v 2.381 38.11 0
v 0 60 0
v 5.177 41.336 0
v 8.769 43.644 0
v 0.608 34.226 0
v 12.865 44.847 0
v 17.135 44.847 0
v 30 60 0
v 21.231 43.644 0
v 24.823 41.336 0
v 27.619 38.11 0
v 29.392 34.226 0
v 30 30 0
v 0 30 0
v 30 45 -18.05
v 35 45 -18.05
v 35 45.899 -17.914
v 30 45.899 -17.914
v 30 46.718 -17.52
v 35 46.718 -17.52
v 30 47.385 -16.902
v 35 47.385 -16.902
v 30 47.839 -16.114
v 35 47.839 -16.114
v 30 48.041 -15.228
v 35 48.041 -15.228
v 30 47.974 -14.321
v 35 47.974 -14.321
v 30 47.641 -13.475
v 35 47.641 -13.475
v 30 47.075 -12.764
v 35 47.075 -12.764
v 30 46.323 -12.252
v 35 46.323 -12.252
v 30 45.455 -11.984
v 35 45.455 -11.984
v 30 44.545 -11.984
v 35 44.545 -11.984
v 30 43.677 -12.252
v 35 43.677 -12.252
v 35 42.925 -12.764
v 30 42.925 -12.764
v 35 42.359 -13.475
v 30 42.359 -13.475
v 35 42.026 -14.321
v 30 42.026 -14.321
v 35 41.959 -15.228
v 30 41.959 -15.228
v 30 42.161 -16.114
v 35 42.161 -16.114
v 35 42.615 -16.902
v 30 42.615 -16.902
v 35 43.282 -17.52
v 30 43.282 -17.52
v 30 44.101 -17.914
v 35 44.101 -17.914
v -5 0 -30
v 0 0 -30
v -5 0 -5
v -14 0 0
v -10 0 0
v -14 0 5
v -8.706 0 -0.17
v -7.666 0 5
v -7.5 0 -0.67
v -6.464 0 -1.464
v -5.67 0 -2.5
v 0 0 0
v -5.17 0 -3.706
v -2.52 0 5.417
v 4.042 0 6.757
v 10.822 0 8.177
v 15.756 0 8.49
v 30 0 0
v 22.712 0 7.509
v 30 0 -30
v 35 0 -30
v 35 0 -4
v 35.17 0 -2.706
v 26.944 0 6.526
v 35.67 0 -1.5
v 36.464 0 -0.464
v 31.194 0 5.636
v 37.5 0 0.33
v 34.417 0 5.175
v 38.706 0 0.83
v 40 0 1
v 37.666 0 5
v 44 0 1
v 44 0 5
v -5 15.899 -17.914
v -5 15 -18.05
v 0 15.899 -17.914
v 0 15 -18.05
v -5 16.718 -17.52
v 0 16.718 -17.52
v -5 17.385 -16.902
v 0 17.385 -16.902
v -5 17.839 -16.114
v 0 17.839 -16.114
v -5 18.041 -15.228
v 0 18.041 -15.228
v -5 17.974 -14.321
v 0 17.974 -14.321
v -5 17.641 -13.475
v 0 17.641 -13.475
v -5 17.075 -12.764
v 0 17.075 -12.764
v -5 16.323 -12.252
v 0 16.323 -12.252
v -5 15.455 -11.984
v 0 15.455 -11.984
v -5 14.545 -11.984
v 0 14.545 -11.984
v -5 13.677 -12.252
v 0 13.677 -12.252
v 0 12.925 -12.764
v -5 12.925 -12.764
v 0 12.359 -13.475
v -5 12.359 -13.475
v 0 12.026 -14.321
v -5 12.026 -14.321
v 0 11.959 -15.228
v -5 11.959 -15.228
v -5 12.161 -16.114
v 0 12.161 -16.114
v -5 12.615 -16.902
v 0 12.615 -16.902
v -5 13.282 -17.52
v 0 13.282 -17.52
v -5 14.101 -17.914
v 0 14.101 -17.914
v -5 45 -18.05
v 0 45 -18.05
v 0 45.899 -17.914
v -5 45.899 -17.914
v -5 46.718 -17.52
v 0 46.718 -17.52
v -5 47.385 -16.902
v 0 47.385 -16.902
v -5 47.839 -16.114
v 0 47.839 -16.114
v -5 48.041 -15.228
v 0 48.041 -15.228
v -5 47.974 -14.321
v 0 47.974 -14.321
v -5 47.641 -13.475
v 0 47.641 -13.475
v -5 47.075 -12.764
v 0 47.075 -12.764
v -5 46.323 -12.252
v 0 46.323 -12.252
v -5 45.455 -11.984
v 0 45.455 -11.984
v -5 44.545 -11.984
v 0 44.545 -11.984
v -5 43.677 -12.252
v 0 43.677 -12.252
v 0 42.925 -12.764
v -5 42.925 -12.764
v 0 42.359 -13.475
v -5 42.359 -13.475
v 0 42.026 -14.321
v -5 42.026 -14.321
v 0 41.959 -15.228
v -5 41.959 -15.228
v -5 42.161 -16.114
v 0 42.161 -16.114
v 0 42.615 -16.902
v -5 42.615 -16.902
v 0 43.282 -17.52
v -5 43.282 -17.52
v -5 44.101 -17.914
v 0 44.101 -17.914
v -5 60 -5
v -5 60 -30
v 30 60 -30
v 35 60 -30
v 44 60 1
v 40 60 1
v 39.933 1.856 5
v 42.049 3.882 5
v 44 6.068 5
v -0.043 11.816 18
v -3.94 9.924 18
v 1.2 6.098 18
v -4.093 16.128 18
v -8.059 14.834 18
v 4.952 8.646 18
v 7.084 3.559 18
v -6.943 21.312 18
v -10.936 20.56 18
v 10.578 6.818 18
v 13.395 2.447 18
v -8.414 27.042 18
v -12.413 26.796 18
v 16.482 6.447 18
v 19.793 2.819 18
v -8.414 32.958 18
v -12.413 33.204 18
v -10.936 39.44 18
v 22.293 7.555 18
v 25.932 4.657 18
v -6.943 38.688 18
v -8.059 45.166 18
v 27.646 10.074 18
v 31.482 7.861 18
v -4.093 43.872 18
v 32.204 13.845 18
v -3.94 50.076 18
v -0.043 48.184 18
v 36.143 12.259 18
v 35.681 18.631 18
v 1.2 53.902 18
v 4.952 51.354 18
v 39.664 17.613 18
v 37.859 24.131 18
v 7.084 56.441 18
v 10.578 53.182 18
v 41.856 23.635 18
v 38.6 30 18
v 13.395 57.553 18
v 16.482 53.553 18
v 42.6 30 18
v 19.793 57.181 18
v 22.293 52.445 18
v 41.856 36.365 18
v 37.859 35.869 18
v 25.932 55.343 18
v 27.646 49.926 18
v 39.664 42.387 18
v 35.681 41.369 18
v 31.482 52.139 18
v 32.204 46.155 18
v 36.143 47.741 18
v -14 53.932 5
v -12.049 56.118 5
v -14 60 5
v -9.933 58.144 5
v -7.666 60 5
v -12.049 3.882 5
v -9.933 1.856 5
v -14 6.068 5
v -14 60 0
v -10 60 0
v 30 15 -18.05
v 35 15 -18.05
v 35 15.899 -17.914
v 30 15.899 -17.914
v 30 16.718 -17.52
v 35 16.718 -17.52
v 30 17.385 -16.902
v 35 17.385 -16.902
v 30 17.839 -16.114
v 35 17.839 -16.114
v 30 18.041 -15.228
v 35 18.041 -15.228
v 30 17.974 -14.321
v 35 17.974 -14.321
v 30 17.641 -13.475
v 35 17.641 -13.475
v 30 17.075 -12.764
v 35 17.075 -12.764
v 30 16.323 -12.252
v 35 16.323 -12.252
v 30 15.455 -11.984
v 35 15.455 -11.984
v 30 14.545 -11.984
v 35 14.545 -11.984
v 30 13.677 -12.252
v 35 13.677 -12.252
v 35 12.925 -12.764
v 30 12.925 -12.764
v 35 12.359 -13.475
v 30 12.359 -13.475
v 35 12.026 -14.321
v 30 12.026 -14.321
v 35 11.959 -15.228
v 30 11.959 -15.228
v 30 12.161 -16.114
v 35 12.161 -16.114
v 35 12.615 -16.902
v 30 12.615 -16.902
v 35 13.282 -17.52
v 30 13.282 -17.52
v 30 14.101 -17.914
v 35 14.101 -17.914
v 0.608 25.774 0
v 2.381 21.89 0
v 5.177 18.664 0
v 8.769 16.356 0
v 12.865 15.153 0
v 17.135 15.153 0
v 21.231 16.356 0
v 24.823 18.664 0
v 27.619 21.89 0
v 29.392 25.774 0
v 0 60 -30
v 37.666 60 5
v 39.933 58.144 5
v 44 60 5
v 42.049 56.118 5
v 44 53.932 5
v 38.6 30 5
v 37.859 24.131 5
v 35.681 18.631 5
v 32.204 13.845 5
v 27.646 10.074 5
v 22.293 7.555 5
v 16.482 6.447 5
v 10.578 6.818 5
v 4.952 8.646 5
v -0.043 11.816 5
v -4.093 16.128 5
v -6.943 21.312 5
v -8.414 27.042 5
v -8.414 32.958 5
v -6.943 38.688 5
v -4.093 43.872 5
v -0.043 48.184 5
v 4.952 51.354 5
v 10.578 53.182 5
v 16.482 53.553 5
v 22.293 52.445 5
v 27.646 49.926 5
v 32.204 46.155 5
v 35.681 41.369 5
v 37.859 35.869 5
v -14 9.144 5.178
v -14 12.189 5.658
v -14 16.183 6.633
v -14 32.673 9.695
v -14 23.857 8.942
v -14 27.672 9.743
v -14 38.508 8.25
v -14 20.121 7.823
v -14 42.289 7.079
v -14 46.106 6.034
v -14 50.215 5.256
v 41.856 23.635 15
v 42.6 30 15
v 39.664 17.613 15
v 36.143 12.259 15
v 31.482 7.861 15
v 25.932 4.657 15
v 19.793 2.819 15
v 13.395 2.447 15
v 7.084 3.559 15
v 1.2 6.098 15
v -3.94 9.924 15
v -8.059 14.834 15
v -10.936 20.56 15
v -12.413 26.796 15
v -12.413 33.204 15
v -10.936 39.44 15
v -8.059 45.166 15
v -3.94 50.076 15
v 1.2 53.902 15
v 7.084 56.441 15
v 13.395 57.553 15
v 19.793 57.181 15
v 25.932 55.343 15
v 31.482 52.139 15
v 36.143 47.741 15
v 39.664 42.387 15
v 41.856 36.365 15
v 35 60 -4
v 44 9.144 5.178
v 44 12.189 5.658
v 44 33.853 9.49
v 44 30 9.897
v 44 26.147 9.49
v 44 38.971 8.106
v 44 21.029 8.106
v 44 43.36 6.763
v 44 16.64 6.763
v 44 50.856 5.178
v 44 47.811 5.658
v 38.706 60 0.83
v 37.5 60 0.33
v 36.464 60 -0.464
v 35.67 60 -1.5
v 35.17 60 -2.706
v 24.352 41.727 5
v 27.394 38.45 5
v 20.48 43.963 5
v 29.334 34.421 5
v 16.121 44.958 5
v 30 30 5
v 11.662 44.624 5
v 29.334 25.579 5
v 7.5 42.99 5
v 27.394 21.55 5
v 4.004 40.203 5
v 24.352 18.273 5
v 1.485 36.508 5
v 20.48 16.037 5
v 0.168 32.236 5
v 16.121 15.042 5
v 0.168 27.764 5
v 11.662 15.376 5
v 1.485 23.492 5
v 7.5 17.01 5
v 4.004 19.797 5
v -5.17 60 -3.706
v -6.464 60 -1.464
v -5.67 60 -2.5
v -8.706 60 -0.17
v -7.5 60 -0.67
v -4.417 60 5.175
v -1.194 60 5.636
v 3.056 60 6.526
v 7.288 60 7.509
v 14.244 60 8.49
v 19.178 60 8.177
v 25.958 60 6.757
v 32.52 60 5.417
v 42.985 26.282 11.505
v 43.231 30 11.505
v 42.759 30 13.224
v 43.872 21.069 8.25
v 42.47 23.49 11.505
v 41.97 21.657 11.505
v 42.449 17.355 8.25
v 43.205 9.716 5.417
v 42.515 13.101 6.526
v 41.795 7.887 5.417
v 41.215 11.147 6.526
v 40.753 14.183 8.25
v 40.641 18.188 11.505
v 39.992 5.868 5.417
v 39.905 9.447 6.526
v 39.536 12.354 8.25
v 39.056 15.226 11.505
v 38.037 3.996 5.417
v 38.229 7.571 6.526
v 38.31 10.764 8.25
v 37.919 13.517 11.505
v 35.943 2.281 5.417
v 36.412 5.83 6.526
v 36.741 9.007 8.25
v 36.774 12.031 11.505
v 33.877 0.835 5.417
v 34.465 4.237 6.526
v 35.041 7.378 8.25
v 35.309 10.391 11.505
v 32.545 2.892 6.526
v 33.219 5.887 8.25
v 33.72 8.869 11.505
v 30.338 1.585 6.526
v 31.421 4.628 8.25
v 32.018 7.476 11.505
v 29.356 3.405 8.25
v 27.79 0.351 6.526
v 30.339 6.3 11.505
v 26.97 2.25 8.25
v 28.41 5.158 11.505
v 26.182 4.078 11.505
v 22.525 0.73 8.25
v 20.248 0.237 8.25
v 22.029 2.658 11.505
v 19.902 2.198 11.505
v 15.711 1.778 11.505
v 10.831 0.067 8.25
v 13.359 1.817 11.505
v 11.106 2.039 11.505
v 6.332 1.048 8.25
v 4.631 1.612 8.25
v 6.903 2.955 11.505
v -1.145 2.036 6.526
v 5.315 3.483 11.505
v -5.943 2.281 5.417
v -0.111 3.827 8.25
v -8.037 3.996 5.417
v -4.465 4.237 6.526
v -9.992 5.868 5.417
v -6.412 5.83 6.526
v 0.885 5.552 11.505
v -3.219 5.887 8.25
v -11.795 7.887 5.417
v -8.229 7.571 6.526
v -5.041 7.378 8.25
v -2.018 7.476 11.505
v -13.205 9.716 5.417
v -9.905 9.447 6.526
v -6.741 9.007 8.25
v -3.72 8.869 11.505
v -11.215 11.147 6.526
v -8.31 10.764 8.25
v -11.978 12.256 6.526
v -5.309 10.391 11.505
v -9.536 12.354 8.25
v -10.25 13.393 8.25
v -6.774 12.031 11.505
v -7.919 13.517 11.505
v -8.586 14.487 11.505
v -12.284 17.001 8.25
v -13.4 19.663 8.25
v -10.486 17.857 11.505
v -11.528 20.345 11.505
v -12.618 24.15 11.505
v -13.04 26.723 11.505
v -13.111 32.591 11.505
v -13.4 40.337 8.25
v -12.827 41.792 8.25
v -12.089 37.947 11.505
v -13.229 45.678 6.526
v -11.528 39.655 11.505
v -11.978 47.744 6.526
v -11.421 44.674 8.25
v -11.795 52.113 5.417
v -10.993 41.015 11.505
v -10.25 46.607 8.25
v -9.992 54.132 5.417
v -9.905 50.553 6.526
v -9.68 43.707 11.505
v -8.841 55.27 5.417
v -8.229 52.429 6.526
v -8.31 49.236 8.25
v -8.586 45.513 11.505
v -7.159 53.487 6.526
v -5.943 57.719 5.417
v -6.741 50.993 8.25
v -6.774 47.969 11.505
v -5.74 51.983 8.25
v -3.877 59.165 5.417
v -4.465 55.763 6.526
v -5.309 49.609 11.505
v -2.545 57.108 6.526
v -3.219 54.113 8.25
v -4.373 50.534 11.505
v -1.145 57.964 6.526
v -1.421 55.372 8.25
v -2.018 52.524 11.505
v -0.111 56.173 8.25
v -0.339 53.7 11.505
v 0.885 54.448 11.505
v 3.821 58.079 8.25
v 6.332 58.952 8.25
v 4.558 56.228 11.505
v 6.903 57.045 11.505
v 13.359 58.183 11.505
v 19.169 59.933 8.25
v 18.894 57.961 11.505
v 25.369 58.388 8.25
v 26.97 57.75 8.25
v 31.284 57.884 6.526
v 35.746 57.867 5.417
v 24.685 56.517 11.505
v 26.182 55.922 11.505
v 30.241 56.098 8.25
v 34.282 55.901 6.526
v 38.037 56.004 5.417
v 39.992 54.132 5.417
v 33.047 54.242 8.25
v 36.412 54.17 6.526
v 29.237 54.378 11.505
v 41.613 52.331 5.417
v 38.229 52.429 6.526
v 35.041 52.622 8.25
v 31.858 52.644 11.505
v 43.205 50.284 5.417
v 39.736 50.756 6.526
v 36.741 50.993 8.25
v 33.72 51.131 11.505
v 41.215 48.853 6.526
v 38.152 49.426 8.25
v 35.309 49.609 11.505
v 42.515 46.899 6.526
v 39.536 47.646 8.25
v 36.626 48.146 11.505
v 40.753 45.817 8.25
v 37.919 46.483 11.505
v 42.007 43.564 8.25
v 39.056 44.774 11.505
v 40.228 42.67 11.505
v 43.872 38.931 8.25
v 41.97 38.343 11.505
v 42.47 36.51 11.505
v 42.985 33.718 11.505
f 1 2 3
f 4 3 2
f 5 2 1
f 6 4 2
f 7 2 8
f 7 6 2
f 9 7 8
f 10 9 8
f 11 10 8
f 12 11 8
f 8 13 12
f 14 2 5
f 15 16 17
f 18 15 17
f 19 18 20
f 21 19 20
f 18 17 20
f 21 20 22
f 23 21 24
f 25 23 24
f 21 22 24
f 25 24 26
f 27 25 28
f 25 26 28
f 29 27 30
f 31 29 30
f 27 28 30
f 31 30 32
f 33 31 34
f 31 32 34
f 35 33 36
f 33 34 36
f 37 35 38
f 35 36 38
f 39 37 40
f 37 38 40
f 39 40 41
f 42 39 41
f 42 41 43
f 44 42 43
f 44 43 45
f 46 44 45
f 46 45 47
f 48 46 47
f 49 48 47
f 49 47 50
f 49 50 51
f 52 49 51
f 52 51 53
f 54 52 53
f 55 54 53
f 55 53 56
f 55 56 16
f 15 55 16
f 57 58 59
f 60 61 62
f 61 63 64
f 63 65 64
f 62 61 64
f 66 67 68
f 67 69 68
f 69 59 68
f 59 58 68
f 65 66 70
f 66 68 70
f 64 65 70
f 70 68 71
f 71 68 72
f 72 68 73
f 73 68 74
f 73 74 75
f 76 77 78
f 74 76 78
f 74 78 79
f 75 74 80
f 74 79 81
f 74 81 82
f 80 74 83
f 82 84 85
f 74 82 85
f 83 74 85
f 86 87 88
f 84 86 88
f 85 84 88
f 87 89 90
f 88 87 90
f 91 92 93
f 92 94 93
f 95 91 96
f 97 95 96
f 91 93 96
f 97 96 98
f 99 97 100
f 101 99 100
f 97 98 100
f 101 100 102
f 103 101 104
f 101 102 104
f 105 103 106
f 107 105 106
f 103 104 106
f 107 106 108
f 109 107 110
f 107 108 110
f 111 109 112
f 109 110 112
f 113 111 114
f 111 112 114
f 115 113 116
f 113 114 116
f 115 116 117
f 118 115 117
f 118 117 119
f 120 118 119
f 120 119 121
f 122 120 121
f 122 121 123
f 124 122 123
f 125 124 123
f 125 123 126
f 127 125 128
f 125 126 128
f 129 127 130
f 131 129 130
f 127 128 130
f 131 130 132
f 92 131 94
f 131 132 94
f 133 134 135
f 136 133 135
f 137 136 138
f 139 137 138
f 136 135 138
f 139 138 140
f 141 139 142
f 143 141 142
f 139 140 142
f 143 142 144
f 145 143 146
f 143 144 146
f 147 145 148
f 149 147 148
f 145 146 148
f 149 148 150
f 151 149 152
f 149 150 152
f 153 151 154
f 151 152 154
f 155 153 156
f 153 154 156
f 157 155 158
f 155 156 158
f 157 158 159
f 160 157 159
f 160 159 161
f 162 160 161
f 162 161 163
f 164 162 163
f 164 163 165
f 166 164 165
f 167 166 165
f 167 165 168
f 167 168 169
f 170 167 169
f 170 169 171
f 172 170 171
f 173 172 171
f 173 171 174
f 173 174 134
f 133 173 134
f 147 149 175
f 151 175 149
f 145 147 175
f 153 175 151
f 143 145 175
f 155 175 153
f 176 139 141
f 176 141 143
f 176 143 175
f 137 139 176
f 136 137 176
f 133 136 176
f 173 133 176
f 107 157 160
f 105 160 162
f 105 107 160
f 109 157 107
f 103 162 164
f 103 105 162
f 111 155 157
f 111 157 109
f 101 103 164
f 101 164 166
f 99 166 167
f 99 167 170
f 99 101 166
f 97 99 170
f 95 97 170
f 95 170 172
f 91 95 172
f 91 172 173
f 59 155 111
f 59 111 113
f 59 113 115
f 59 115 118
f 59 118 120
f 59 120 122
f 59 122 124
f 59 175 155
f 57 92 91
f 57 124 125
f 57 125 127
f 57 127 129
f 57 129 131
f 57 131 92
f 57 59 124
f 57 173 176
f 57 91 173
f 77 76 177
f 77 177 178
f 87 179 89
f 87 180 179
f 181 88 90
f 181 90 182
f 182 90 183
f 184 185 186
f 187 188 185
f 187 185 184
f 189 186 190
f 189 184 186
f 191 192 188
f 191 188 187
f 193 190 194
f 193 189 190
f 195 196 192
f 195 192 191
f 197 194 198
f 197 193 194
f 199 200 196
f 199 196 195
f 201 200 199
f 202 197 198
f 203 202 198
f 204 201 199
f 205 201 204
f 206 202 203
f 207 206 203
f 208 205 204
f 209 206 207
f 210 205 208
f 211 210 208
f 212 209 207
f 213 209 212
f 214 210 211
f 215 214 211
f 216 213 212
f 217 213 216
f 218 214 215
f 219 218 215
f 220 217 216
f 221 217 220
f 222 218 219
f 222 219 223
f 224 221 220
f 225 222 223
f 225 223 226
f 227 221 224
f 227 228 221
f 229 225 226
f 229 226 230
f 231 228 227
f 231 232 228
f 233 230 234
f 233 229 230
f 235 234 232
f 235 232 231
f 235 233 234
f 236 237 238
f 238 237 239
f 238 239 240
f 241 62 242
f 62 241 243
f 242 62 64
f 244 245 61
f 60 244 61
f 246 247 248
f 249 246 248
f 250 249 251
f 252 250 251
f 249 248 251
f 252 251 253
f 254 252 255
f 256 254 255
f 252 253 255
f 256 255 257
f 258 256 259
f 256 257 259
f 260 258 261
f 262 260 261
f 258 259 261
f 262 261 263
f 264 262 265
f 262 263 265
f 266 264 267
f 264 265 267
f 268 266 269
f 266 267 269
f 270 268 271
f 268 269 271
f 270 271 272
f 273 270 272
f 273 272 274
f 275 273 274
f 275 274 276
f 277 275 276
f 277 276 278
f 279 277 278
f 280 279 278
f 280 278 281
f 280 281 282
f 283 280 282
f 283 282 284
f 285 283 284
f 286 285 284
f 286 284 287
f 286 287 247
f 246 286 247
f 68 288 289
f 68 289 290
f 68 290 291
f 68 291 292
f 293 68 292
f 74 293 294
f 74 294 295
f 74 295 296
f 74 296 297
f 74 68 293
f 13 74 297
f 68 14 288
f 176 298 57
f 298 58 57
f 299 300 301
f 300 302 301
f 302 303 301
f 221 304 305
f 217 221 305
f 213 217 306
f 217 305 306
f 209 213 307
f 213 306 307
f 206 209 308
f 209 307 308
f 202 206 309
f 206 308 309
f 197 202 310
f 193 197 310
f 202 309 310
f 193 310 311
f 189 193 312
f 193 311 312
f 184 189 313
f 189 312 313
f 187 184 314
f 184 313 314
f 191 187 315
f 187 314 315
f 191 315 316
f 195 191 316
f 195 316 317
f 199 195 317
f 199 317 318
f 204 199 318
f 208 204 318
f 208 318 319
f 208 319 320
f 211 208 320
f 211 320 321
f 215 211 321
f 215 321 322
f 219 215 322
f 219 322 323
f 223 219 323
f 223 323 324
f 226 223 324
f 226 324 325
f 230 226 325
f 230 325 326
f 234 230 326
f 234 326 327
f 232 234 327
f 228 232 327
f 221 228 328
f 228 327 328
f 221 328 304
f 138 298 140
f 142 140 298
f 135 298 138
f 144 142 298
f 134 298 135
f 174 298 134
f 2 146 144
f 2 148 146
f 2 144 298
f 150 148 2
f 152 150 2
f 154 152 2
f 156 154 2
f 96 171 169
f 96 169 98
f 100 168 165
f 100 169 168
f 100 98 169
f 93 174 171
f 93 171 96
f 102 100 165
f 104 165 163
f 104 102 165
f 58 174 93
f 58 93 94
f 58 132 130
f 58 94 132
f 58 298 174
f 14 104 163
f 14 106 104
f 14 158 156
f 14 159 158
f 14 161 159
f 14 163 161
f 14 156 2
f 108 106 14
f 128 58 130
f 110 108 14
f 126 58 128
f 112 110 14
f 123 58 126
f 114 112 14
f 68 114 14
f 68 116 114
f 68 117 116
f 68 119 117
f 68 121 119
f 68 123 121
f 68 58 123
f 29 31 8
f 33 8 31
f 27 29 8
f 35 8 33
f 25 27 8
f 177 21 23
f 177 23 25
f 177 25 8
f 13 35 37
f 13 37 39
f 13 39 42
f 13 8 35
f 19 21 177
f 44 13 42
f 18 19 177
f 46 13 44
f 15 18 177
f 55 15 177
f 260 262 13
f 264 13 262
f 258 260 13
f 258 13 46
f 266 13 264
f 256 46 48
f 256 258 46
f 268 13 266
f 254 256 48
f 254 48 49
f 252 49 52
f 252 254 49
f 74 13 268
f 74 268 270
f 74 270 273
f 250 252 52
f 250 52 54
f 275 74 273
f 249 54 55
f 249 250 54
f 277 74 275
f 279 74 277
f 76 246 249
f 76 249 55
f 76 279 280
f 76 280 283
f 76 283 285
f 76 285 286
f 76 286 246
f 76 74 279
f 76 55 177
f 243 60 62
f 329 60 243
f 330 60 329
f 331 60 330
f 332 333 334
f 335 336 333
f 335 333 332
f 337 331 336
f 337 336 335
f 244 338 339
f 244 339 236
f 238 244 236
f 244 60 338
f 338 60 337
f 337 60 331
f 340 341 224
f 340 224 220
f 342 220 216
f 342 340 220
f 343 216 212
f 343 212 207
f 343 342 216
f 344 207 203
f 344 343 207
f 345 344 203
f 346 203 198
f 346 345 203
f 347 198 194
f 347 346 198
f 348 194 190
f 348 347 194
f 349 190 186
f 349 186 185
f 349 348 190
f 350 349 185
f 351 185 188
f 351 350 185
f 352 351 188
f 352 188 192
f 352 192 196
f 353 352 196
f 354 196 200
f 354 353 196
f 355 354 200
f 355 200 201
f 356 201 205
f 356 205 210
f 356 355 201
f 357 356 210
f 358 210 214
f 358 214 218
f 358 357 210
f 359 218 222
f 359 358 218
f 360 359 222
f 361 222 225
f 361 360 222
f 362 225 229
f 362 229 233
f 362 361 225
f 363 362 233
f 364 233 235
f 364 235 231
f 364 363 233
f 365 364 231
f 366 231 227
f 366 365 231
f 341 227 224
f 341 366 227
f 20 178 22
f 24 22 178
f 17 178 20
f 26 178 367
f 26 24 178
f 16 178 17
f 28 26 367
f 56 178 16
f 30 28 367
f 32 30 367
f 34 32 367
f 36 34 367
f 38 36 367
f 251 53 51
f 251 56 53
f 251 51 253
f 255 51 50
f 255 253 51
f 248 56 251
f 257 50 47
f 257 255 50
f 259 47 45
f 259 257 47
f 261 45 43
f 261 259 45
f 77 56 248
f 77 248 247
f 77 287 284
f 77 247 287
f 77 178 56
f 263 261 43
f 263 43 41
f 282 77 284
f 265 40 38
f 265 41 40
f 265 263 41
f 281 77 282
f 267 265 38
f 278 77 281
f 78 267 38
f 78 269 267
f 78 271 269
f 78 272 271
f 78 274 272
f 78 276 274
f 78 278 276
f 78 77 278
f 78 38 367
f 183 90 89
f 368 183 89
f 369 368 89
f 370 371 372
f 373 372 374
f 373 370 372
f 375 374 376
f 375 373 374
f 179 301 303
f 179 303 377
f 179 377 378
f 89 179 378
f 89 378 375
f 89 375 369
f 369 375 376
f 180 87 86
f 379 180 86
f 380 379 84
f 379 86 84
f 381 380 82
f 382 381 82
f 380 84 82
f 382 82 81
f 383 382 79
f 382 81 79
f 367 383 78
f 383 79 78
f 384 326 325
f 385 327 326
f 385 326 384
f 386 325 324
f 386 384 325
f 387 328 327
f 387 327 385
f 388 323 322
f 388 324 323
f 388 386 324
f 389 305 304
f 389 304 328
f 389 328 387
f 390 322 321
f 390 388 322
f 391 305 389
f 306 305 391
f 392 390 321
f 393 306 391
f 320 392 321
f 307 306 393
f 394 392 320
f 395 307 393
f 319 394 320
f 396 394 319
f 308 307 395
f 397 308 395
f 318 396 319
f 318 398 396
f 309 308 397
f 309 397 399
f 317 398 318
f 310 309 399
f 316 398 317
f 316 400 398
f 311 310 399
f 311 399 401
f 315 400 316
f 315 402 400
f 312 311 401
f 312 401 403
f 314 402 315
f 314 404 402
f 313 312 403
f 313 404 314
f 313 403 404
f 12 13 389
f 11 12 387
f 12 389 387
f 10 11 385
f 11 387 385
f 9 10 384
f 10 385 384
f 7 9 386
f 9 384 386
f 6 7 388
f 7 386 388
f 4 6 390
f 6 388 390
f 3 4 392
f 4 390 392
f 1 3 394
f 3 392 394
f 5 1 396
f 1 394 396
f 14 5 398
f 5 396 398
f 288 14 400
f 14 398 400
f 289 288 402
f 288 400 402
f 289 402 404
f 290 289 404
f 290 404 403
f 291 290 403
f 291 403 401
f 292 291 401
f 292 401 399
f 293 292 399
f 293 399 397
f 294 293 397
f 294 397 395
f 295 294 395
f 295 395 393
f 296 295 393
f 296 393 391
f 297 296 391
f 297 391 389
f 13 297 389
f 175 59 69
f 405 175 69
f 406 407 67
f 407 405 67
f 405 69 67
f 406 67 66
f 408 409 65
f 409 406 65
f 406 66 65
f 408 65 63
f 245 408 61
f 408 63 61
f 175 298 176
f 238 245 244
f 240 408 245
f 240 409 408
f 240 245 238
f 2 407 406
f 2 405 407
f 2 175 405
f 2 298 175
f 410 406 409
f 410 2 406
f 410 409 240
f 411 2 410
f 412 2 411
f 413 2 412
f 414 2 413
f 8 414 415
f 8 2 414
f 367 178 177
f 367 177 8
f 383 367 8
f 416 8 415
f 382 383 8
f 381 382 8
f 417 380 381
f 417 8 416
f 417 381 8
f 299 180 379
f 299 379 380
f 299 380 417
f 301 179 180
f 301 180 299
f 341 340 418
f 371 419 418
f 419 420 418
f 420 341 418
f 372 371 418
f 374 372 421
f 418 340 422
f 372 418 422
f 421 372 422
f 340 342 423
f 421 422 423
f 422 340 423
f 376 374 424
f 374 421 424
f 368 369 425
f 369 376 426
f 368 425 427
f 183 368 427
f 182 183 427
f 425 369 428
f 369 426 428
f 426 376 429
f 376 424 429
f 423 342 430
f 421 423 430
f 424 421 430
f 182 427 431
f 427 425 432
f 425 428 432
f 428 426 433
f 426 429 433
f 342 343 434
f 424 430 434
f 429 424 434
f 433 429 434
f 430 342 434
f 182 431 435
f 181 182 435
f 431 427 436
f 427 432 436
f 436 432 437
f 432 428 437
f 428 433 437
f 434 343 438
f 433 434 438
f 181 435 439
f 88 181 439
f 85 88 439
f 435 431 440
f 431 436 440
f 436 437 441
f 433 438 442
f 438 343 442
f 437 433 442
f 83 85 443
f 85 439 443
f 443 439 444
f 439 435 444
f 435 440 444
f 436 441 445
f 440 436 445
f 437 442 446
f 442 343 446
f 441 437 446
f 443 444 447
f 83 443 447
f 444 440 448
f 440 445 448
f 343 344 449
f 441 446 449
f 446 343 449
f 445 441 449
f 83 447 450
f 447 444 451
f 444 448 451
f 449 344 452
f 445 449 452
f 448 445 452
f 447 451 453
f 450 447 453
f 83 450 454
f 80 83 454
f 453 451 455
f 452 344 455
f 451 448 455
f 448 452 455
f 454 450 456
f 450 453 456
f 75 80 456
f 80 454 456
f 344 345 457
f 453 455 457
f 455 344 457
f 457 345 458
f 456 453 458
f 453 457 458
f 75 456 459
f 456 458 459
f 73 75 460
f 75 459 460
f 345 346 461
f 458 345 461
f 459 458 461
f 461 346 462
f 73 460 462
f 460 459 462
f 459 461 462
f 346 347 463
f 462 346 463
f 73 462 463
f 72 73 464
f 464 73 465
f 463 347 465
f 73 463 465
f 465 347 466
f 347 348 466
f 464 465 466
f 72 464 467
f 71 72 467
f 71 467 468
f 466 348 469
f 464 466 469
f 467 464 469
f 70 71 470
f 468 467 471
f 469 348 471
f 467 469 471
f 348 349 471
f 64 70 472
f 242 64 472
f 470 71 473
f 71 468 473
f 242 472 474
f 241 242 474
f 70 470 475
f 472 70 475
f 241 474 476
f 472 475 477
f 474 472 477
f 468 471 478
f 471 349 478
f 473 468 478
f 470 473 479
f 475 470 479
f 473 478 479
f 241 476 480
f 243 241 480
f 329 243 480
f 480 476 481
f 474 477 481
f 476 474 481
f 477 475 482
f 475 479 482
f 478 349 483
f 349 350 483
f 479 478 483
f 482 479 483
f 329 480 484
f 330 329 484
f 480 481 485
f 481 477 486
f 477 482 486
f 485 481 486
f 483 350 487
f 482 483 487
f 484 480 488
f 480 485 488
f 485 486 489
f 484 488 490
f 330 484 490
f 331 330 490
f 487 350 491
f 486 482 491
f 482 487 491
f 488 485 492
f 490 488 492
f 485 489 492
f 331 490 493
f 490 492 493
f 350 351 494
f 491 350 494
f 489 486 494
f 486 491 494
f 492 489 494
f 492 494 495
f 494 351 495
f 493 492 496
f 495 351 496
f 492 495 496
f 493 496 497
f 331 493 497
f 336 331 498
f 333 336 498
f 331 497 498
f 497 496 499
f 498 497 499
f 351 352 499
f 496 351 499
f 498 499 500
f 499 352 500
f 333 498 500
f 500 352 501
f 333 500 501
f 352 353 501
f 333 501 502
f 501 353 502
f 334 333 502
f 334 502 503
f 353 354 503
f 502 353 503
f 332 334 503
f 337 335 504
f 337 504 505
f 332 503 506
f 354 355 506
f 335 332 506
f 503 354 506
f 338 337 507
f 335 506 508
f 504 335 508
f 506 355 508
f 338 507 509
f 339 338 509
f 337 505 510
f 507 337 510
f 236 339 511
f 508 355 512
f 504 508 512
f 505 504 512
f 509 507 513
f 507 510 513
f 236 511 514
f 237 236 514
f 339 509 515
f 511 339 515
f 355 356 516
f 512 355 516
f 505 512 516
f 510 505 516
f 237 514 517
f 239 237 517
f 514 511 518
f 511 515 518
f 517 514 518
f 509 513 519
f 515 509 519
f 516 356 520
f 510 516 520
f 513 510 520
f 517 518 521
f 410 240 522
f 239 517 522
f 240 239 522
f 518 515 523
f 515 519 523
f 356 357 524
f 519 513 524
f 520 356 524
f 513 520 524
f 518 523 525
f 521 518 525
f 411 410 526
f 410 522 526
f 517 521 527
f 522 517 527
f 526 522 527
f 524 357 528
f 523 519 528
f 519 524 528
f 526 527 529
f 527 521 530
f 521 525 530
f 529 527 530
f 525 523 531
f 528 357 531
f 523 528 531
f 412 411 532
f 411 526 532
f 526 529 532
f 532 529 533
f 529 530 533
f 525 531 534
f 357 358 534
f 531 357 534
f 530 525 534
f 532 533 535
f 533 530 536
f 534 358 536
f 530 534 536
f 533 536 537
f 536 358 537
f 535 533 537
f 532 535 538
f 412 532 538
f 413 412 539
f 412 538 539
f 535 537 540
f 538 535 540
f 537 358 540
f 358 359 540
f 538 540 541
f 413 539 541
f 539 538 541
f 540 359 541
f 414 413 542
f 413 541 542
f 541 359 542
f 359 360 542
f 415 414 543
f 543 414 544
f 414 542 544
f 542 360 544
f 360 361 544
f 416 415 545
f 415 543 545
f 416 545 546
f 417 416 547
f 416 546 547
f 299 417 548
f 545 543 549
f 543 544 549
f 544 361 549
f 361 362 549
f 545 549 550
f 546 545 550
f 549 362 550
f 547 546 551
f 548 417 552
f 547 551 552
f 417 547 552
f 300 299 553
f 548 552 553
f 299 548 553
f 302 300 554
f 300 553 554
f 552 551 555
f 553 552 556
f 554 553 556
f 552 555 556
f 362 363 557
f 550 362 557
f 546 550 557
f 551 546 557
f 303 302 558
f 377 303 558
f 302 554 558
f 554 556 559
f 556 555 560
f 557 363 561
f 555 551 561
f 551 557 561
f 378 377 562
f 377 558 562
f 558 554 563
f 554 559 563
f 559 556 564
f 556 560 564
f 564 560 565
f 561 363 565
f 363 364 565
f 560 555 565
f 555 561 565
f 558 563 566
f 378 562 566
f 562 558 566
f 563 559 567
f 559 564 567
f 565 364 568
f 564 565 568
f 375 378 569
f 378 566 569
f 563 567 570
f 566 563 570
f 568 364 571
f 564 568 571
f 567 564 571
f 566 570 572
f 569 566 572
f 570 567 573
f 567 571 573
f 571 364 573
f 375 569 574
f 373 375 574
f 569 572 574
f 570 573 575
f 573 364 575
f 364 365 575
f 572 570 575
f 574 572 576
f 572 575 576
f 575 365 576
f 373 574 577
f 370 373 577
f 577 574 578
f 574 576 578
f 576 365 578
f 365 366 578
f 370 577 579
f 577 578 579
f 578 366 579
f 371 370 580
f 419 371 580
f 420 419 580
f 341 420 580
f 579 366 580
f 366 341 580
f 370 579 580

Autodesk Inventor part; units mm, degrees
ref_plane "YZ Plane" through (0, 0, 0) normal (1, 0, 0) x (0, 1, 0)
ref_plane "XZ Plane" through (0, 0, 0) normal (0, 1, 0) x (-1, 0, 0)
ref_plane "XY Plane" through (0, 0, 0) normal (0, 0, 1) x (1, 0, 0)
sketch "Sketch1" plane through (0, 0, 0) normal (0, 1, 0) x (-1, 0, 0)
  line L0 (0, 0) -> (-30, 0)
  line L1 (-30, 0) -> (-30, -30)
  line L2 (-30, -30) -> (0, -30)
  line L3 (0, -30) -> (0, 0)
  line L4 (-35, -35) -> (-35, 5)
  line L5 (-35, 5) -> (5, 5)
  line L6 (5, 5) -> (5, -35)
  line L7 (5, -35) -> (-35, -35)
  line L8 (0, -30) -> (5, -30)
  line L9 (-30, -30) -> (-35, -30)
  dimension "d0" = 30
  dimension "d1" = 30
  dimension "d2" = 5
extrude "Extrusion1" add sketch "Sketch1" along normal blind 60 contours L0 L1 L9 L4 L5 L6 L8 L3
sketch "Sketch2" plane through (-5, 0, 5) normal (0, 0, 1) x (1, 0, 0)
  line L0 (0, 0) -> (40, 0) projected
  line L1 (40, 0) -> (40, 60) projected
  line L2 (0, 60) -> (40, 60) projected
  line L3 (0, 0) -> (0, 60) projected
  line L4 (0, 60) -> (40, 60) projected
  line L5 (0, 0) -> (40, 0) projected
  line L6 (0, 60) -> (40, 0) construction
  circle A0 centre (20, 30) radius 23.6
  circle A1 centre (20, 30) radius 27.6
  dimension "d5" = 47.2
  dimension "d6" = 4
extrude "Extrusion2" add sketch "Sketch2" along normal blind 13 contours A1 L3 A0 | L3 A0 L1 A1 | L1 A0 A1 | A1 L1 A0 L3
sketch "Sketch3" plane through (35, 0, 5) normal (1, 0, 0) x (0, 0, -1)
  line L0 (5, 60) -> (35, 60) projected
  line L1 (35, 60) -> (0, 60) projected
  line L2 (5, 0) -> (35, 0) projected
  line L3 (0, 60) -> (4, 60)
  line L4 (4, 60) -> (4, 0)
  line L5 (4, 0) -> (0, 0)
  line L6 (0, 0) -> (0, 60)
  point P0 (4, 60)
  dimension "d10" = 4
extrude "Extrusion3" add sketch "Sketch3" along normal blind 9
sketch "Sketch4" plane through (-5, 0, -30) normal (-1, 0, 0) x (0, 0, 1)
  line L0 (0, 60) -> (35, 60) projected
  line L1 (30, 0) -> (0, 0) projected
  line L2 (35, 60) -> (30, 60)
  line L3 (30, 60) -> (30, 0)
  line L4 (30, 0) -> (35, 0)
  line L5 (35, 0) -> (35, 60)
extrude "Extrusion4" add sketch "Sketch4" along normal blind 9
sketch "Sketch5" plane through (15, 30, 5) normal (0, 0, 1) x (1, 0, 0)
  circle A0 centre (0, 0) radius 23.6 projected
  circle A1 centre (0, 0) radius 15
  point P0 (-15, -30)
  dimension "d15" = 30
extrude "Extrusion5" cut sketch "Sketch5" against normal blind 9 contours A1
fillet "Fillet1" radius 10 1 edges at (-12.6, 30, 5)
sketch "Sketch7" plane through (35, 0, -30) normal (1, 0, 0) x (0, 0, -1)
  line L0 (-31, 60) -> (-31, 0) projected
  line L1 (-31, 0) -> (0, 0) projected
  line L2 (0, 0) -> (0, 60) projected
  line L3 (-31, 60) -> (0, 60) projected
  line L4 (-30, 0) -> (0, 0) projected
  line L5 (-15, 0) -> (-15, 15) construction
  line L6 (-15, 15) -> (-15, 45) construction
  line L7 (-15, 45) -> (-15, 60) construction
  line L8 (0, 60) -> (-31, 60) projected
  circle A0 centre (-15, 15) radius 3.05
  circle A1 centre (-15, 45) radius 3.05
  dimension "d19" = 30
  dimension "d20" = 6.1
extrude "Extrusion6" cut sketch "Sketch7" against normal blind 40 contours A0 | A1
fillet "Fillet2" radius 5 2 edges at (-5, 30, 0) (35, 30, 1)
properties part number "Bearing holder_3DPrint"
